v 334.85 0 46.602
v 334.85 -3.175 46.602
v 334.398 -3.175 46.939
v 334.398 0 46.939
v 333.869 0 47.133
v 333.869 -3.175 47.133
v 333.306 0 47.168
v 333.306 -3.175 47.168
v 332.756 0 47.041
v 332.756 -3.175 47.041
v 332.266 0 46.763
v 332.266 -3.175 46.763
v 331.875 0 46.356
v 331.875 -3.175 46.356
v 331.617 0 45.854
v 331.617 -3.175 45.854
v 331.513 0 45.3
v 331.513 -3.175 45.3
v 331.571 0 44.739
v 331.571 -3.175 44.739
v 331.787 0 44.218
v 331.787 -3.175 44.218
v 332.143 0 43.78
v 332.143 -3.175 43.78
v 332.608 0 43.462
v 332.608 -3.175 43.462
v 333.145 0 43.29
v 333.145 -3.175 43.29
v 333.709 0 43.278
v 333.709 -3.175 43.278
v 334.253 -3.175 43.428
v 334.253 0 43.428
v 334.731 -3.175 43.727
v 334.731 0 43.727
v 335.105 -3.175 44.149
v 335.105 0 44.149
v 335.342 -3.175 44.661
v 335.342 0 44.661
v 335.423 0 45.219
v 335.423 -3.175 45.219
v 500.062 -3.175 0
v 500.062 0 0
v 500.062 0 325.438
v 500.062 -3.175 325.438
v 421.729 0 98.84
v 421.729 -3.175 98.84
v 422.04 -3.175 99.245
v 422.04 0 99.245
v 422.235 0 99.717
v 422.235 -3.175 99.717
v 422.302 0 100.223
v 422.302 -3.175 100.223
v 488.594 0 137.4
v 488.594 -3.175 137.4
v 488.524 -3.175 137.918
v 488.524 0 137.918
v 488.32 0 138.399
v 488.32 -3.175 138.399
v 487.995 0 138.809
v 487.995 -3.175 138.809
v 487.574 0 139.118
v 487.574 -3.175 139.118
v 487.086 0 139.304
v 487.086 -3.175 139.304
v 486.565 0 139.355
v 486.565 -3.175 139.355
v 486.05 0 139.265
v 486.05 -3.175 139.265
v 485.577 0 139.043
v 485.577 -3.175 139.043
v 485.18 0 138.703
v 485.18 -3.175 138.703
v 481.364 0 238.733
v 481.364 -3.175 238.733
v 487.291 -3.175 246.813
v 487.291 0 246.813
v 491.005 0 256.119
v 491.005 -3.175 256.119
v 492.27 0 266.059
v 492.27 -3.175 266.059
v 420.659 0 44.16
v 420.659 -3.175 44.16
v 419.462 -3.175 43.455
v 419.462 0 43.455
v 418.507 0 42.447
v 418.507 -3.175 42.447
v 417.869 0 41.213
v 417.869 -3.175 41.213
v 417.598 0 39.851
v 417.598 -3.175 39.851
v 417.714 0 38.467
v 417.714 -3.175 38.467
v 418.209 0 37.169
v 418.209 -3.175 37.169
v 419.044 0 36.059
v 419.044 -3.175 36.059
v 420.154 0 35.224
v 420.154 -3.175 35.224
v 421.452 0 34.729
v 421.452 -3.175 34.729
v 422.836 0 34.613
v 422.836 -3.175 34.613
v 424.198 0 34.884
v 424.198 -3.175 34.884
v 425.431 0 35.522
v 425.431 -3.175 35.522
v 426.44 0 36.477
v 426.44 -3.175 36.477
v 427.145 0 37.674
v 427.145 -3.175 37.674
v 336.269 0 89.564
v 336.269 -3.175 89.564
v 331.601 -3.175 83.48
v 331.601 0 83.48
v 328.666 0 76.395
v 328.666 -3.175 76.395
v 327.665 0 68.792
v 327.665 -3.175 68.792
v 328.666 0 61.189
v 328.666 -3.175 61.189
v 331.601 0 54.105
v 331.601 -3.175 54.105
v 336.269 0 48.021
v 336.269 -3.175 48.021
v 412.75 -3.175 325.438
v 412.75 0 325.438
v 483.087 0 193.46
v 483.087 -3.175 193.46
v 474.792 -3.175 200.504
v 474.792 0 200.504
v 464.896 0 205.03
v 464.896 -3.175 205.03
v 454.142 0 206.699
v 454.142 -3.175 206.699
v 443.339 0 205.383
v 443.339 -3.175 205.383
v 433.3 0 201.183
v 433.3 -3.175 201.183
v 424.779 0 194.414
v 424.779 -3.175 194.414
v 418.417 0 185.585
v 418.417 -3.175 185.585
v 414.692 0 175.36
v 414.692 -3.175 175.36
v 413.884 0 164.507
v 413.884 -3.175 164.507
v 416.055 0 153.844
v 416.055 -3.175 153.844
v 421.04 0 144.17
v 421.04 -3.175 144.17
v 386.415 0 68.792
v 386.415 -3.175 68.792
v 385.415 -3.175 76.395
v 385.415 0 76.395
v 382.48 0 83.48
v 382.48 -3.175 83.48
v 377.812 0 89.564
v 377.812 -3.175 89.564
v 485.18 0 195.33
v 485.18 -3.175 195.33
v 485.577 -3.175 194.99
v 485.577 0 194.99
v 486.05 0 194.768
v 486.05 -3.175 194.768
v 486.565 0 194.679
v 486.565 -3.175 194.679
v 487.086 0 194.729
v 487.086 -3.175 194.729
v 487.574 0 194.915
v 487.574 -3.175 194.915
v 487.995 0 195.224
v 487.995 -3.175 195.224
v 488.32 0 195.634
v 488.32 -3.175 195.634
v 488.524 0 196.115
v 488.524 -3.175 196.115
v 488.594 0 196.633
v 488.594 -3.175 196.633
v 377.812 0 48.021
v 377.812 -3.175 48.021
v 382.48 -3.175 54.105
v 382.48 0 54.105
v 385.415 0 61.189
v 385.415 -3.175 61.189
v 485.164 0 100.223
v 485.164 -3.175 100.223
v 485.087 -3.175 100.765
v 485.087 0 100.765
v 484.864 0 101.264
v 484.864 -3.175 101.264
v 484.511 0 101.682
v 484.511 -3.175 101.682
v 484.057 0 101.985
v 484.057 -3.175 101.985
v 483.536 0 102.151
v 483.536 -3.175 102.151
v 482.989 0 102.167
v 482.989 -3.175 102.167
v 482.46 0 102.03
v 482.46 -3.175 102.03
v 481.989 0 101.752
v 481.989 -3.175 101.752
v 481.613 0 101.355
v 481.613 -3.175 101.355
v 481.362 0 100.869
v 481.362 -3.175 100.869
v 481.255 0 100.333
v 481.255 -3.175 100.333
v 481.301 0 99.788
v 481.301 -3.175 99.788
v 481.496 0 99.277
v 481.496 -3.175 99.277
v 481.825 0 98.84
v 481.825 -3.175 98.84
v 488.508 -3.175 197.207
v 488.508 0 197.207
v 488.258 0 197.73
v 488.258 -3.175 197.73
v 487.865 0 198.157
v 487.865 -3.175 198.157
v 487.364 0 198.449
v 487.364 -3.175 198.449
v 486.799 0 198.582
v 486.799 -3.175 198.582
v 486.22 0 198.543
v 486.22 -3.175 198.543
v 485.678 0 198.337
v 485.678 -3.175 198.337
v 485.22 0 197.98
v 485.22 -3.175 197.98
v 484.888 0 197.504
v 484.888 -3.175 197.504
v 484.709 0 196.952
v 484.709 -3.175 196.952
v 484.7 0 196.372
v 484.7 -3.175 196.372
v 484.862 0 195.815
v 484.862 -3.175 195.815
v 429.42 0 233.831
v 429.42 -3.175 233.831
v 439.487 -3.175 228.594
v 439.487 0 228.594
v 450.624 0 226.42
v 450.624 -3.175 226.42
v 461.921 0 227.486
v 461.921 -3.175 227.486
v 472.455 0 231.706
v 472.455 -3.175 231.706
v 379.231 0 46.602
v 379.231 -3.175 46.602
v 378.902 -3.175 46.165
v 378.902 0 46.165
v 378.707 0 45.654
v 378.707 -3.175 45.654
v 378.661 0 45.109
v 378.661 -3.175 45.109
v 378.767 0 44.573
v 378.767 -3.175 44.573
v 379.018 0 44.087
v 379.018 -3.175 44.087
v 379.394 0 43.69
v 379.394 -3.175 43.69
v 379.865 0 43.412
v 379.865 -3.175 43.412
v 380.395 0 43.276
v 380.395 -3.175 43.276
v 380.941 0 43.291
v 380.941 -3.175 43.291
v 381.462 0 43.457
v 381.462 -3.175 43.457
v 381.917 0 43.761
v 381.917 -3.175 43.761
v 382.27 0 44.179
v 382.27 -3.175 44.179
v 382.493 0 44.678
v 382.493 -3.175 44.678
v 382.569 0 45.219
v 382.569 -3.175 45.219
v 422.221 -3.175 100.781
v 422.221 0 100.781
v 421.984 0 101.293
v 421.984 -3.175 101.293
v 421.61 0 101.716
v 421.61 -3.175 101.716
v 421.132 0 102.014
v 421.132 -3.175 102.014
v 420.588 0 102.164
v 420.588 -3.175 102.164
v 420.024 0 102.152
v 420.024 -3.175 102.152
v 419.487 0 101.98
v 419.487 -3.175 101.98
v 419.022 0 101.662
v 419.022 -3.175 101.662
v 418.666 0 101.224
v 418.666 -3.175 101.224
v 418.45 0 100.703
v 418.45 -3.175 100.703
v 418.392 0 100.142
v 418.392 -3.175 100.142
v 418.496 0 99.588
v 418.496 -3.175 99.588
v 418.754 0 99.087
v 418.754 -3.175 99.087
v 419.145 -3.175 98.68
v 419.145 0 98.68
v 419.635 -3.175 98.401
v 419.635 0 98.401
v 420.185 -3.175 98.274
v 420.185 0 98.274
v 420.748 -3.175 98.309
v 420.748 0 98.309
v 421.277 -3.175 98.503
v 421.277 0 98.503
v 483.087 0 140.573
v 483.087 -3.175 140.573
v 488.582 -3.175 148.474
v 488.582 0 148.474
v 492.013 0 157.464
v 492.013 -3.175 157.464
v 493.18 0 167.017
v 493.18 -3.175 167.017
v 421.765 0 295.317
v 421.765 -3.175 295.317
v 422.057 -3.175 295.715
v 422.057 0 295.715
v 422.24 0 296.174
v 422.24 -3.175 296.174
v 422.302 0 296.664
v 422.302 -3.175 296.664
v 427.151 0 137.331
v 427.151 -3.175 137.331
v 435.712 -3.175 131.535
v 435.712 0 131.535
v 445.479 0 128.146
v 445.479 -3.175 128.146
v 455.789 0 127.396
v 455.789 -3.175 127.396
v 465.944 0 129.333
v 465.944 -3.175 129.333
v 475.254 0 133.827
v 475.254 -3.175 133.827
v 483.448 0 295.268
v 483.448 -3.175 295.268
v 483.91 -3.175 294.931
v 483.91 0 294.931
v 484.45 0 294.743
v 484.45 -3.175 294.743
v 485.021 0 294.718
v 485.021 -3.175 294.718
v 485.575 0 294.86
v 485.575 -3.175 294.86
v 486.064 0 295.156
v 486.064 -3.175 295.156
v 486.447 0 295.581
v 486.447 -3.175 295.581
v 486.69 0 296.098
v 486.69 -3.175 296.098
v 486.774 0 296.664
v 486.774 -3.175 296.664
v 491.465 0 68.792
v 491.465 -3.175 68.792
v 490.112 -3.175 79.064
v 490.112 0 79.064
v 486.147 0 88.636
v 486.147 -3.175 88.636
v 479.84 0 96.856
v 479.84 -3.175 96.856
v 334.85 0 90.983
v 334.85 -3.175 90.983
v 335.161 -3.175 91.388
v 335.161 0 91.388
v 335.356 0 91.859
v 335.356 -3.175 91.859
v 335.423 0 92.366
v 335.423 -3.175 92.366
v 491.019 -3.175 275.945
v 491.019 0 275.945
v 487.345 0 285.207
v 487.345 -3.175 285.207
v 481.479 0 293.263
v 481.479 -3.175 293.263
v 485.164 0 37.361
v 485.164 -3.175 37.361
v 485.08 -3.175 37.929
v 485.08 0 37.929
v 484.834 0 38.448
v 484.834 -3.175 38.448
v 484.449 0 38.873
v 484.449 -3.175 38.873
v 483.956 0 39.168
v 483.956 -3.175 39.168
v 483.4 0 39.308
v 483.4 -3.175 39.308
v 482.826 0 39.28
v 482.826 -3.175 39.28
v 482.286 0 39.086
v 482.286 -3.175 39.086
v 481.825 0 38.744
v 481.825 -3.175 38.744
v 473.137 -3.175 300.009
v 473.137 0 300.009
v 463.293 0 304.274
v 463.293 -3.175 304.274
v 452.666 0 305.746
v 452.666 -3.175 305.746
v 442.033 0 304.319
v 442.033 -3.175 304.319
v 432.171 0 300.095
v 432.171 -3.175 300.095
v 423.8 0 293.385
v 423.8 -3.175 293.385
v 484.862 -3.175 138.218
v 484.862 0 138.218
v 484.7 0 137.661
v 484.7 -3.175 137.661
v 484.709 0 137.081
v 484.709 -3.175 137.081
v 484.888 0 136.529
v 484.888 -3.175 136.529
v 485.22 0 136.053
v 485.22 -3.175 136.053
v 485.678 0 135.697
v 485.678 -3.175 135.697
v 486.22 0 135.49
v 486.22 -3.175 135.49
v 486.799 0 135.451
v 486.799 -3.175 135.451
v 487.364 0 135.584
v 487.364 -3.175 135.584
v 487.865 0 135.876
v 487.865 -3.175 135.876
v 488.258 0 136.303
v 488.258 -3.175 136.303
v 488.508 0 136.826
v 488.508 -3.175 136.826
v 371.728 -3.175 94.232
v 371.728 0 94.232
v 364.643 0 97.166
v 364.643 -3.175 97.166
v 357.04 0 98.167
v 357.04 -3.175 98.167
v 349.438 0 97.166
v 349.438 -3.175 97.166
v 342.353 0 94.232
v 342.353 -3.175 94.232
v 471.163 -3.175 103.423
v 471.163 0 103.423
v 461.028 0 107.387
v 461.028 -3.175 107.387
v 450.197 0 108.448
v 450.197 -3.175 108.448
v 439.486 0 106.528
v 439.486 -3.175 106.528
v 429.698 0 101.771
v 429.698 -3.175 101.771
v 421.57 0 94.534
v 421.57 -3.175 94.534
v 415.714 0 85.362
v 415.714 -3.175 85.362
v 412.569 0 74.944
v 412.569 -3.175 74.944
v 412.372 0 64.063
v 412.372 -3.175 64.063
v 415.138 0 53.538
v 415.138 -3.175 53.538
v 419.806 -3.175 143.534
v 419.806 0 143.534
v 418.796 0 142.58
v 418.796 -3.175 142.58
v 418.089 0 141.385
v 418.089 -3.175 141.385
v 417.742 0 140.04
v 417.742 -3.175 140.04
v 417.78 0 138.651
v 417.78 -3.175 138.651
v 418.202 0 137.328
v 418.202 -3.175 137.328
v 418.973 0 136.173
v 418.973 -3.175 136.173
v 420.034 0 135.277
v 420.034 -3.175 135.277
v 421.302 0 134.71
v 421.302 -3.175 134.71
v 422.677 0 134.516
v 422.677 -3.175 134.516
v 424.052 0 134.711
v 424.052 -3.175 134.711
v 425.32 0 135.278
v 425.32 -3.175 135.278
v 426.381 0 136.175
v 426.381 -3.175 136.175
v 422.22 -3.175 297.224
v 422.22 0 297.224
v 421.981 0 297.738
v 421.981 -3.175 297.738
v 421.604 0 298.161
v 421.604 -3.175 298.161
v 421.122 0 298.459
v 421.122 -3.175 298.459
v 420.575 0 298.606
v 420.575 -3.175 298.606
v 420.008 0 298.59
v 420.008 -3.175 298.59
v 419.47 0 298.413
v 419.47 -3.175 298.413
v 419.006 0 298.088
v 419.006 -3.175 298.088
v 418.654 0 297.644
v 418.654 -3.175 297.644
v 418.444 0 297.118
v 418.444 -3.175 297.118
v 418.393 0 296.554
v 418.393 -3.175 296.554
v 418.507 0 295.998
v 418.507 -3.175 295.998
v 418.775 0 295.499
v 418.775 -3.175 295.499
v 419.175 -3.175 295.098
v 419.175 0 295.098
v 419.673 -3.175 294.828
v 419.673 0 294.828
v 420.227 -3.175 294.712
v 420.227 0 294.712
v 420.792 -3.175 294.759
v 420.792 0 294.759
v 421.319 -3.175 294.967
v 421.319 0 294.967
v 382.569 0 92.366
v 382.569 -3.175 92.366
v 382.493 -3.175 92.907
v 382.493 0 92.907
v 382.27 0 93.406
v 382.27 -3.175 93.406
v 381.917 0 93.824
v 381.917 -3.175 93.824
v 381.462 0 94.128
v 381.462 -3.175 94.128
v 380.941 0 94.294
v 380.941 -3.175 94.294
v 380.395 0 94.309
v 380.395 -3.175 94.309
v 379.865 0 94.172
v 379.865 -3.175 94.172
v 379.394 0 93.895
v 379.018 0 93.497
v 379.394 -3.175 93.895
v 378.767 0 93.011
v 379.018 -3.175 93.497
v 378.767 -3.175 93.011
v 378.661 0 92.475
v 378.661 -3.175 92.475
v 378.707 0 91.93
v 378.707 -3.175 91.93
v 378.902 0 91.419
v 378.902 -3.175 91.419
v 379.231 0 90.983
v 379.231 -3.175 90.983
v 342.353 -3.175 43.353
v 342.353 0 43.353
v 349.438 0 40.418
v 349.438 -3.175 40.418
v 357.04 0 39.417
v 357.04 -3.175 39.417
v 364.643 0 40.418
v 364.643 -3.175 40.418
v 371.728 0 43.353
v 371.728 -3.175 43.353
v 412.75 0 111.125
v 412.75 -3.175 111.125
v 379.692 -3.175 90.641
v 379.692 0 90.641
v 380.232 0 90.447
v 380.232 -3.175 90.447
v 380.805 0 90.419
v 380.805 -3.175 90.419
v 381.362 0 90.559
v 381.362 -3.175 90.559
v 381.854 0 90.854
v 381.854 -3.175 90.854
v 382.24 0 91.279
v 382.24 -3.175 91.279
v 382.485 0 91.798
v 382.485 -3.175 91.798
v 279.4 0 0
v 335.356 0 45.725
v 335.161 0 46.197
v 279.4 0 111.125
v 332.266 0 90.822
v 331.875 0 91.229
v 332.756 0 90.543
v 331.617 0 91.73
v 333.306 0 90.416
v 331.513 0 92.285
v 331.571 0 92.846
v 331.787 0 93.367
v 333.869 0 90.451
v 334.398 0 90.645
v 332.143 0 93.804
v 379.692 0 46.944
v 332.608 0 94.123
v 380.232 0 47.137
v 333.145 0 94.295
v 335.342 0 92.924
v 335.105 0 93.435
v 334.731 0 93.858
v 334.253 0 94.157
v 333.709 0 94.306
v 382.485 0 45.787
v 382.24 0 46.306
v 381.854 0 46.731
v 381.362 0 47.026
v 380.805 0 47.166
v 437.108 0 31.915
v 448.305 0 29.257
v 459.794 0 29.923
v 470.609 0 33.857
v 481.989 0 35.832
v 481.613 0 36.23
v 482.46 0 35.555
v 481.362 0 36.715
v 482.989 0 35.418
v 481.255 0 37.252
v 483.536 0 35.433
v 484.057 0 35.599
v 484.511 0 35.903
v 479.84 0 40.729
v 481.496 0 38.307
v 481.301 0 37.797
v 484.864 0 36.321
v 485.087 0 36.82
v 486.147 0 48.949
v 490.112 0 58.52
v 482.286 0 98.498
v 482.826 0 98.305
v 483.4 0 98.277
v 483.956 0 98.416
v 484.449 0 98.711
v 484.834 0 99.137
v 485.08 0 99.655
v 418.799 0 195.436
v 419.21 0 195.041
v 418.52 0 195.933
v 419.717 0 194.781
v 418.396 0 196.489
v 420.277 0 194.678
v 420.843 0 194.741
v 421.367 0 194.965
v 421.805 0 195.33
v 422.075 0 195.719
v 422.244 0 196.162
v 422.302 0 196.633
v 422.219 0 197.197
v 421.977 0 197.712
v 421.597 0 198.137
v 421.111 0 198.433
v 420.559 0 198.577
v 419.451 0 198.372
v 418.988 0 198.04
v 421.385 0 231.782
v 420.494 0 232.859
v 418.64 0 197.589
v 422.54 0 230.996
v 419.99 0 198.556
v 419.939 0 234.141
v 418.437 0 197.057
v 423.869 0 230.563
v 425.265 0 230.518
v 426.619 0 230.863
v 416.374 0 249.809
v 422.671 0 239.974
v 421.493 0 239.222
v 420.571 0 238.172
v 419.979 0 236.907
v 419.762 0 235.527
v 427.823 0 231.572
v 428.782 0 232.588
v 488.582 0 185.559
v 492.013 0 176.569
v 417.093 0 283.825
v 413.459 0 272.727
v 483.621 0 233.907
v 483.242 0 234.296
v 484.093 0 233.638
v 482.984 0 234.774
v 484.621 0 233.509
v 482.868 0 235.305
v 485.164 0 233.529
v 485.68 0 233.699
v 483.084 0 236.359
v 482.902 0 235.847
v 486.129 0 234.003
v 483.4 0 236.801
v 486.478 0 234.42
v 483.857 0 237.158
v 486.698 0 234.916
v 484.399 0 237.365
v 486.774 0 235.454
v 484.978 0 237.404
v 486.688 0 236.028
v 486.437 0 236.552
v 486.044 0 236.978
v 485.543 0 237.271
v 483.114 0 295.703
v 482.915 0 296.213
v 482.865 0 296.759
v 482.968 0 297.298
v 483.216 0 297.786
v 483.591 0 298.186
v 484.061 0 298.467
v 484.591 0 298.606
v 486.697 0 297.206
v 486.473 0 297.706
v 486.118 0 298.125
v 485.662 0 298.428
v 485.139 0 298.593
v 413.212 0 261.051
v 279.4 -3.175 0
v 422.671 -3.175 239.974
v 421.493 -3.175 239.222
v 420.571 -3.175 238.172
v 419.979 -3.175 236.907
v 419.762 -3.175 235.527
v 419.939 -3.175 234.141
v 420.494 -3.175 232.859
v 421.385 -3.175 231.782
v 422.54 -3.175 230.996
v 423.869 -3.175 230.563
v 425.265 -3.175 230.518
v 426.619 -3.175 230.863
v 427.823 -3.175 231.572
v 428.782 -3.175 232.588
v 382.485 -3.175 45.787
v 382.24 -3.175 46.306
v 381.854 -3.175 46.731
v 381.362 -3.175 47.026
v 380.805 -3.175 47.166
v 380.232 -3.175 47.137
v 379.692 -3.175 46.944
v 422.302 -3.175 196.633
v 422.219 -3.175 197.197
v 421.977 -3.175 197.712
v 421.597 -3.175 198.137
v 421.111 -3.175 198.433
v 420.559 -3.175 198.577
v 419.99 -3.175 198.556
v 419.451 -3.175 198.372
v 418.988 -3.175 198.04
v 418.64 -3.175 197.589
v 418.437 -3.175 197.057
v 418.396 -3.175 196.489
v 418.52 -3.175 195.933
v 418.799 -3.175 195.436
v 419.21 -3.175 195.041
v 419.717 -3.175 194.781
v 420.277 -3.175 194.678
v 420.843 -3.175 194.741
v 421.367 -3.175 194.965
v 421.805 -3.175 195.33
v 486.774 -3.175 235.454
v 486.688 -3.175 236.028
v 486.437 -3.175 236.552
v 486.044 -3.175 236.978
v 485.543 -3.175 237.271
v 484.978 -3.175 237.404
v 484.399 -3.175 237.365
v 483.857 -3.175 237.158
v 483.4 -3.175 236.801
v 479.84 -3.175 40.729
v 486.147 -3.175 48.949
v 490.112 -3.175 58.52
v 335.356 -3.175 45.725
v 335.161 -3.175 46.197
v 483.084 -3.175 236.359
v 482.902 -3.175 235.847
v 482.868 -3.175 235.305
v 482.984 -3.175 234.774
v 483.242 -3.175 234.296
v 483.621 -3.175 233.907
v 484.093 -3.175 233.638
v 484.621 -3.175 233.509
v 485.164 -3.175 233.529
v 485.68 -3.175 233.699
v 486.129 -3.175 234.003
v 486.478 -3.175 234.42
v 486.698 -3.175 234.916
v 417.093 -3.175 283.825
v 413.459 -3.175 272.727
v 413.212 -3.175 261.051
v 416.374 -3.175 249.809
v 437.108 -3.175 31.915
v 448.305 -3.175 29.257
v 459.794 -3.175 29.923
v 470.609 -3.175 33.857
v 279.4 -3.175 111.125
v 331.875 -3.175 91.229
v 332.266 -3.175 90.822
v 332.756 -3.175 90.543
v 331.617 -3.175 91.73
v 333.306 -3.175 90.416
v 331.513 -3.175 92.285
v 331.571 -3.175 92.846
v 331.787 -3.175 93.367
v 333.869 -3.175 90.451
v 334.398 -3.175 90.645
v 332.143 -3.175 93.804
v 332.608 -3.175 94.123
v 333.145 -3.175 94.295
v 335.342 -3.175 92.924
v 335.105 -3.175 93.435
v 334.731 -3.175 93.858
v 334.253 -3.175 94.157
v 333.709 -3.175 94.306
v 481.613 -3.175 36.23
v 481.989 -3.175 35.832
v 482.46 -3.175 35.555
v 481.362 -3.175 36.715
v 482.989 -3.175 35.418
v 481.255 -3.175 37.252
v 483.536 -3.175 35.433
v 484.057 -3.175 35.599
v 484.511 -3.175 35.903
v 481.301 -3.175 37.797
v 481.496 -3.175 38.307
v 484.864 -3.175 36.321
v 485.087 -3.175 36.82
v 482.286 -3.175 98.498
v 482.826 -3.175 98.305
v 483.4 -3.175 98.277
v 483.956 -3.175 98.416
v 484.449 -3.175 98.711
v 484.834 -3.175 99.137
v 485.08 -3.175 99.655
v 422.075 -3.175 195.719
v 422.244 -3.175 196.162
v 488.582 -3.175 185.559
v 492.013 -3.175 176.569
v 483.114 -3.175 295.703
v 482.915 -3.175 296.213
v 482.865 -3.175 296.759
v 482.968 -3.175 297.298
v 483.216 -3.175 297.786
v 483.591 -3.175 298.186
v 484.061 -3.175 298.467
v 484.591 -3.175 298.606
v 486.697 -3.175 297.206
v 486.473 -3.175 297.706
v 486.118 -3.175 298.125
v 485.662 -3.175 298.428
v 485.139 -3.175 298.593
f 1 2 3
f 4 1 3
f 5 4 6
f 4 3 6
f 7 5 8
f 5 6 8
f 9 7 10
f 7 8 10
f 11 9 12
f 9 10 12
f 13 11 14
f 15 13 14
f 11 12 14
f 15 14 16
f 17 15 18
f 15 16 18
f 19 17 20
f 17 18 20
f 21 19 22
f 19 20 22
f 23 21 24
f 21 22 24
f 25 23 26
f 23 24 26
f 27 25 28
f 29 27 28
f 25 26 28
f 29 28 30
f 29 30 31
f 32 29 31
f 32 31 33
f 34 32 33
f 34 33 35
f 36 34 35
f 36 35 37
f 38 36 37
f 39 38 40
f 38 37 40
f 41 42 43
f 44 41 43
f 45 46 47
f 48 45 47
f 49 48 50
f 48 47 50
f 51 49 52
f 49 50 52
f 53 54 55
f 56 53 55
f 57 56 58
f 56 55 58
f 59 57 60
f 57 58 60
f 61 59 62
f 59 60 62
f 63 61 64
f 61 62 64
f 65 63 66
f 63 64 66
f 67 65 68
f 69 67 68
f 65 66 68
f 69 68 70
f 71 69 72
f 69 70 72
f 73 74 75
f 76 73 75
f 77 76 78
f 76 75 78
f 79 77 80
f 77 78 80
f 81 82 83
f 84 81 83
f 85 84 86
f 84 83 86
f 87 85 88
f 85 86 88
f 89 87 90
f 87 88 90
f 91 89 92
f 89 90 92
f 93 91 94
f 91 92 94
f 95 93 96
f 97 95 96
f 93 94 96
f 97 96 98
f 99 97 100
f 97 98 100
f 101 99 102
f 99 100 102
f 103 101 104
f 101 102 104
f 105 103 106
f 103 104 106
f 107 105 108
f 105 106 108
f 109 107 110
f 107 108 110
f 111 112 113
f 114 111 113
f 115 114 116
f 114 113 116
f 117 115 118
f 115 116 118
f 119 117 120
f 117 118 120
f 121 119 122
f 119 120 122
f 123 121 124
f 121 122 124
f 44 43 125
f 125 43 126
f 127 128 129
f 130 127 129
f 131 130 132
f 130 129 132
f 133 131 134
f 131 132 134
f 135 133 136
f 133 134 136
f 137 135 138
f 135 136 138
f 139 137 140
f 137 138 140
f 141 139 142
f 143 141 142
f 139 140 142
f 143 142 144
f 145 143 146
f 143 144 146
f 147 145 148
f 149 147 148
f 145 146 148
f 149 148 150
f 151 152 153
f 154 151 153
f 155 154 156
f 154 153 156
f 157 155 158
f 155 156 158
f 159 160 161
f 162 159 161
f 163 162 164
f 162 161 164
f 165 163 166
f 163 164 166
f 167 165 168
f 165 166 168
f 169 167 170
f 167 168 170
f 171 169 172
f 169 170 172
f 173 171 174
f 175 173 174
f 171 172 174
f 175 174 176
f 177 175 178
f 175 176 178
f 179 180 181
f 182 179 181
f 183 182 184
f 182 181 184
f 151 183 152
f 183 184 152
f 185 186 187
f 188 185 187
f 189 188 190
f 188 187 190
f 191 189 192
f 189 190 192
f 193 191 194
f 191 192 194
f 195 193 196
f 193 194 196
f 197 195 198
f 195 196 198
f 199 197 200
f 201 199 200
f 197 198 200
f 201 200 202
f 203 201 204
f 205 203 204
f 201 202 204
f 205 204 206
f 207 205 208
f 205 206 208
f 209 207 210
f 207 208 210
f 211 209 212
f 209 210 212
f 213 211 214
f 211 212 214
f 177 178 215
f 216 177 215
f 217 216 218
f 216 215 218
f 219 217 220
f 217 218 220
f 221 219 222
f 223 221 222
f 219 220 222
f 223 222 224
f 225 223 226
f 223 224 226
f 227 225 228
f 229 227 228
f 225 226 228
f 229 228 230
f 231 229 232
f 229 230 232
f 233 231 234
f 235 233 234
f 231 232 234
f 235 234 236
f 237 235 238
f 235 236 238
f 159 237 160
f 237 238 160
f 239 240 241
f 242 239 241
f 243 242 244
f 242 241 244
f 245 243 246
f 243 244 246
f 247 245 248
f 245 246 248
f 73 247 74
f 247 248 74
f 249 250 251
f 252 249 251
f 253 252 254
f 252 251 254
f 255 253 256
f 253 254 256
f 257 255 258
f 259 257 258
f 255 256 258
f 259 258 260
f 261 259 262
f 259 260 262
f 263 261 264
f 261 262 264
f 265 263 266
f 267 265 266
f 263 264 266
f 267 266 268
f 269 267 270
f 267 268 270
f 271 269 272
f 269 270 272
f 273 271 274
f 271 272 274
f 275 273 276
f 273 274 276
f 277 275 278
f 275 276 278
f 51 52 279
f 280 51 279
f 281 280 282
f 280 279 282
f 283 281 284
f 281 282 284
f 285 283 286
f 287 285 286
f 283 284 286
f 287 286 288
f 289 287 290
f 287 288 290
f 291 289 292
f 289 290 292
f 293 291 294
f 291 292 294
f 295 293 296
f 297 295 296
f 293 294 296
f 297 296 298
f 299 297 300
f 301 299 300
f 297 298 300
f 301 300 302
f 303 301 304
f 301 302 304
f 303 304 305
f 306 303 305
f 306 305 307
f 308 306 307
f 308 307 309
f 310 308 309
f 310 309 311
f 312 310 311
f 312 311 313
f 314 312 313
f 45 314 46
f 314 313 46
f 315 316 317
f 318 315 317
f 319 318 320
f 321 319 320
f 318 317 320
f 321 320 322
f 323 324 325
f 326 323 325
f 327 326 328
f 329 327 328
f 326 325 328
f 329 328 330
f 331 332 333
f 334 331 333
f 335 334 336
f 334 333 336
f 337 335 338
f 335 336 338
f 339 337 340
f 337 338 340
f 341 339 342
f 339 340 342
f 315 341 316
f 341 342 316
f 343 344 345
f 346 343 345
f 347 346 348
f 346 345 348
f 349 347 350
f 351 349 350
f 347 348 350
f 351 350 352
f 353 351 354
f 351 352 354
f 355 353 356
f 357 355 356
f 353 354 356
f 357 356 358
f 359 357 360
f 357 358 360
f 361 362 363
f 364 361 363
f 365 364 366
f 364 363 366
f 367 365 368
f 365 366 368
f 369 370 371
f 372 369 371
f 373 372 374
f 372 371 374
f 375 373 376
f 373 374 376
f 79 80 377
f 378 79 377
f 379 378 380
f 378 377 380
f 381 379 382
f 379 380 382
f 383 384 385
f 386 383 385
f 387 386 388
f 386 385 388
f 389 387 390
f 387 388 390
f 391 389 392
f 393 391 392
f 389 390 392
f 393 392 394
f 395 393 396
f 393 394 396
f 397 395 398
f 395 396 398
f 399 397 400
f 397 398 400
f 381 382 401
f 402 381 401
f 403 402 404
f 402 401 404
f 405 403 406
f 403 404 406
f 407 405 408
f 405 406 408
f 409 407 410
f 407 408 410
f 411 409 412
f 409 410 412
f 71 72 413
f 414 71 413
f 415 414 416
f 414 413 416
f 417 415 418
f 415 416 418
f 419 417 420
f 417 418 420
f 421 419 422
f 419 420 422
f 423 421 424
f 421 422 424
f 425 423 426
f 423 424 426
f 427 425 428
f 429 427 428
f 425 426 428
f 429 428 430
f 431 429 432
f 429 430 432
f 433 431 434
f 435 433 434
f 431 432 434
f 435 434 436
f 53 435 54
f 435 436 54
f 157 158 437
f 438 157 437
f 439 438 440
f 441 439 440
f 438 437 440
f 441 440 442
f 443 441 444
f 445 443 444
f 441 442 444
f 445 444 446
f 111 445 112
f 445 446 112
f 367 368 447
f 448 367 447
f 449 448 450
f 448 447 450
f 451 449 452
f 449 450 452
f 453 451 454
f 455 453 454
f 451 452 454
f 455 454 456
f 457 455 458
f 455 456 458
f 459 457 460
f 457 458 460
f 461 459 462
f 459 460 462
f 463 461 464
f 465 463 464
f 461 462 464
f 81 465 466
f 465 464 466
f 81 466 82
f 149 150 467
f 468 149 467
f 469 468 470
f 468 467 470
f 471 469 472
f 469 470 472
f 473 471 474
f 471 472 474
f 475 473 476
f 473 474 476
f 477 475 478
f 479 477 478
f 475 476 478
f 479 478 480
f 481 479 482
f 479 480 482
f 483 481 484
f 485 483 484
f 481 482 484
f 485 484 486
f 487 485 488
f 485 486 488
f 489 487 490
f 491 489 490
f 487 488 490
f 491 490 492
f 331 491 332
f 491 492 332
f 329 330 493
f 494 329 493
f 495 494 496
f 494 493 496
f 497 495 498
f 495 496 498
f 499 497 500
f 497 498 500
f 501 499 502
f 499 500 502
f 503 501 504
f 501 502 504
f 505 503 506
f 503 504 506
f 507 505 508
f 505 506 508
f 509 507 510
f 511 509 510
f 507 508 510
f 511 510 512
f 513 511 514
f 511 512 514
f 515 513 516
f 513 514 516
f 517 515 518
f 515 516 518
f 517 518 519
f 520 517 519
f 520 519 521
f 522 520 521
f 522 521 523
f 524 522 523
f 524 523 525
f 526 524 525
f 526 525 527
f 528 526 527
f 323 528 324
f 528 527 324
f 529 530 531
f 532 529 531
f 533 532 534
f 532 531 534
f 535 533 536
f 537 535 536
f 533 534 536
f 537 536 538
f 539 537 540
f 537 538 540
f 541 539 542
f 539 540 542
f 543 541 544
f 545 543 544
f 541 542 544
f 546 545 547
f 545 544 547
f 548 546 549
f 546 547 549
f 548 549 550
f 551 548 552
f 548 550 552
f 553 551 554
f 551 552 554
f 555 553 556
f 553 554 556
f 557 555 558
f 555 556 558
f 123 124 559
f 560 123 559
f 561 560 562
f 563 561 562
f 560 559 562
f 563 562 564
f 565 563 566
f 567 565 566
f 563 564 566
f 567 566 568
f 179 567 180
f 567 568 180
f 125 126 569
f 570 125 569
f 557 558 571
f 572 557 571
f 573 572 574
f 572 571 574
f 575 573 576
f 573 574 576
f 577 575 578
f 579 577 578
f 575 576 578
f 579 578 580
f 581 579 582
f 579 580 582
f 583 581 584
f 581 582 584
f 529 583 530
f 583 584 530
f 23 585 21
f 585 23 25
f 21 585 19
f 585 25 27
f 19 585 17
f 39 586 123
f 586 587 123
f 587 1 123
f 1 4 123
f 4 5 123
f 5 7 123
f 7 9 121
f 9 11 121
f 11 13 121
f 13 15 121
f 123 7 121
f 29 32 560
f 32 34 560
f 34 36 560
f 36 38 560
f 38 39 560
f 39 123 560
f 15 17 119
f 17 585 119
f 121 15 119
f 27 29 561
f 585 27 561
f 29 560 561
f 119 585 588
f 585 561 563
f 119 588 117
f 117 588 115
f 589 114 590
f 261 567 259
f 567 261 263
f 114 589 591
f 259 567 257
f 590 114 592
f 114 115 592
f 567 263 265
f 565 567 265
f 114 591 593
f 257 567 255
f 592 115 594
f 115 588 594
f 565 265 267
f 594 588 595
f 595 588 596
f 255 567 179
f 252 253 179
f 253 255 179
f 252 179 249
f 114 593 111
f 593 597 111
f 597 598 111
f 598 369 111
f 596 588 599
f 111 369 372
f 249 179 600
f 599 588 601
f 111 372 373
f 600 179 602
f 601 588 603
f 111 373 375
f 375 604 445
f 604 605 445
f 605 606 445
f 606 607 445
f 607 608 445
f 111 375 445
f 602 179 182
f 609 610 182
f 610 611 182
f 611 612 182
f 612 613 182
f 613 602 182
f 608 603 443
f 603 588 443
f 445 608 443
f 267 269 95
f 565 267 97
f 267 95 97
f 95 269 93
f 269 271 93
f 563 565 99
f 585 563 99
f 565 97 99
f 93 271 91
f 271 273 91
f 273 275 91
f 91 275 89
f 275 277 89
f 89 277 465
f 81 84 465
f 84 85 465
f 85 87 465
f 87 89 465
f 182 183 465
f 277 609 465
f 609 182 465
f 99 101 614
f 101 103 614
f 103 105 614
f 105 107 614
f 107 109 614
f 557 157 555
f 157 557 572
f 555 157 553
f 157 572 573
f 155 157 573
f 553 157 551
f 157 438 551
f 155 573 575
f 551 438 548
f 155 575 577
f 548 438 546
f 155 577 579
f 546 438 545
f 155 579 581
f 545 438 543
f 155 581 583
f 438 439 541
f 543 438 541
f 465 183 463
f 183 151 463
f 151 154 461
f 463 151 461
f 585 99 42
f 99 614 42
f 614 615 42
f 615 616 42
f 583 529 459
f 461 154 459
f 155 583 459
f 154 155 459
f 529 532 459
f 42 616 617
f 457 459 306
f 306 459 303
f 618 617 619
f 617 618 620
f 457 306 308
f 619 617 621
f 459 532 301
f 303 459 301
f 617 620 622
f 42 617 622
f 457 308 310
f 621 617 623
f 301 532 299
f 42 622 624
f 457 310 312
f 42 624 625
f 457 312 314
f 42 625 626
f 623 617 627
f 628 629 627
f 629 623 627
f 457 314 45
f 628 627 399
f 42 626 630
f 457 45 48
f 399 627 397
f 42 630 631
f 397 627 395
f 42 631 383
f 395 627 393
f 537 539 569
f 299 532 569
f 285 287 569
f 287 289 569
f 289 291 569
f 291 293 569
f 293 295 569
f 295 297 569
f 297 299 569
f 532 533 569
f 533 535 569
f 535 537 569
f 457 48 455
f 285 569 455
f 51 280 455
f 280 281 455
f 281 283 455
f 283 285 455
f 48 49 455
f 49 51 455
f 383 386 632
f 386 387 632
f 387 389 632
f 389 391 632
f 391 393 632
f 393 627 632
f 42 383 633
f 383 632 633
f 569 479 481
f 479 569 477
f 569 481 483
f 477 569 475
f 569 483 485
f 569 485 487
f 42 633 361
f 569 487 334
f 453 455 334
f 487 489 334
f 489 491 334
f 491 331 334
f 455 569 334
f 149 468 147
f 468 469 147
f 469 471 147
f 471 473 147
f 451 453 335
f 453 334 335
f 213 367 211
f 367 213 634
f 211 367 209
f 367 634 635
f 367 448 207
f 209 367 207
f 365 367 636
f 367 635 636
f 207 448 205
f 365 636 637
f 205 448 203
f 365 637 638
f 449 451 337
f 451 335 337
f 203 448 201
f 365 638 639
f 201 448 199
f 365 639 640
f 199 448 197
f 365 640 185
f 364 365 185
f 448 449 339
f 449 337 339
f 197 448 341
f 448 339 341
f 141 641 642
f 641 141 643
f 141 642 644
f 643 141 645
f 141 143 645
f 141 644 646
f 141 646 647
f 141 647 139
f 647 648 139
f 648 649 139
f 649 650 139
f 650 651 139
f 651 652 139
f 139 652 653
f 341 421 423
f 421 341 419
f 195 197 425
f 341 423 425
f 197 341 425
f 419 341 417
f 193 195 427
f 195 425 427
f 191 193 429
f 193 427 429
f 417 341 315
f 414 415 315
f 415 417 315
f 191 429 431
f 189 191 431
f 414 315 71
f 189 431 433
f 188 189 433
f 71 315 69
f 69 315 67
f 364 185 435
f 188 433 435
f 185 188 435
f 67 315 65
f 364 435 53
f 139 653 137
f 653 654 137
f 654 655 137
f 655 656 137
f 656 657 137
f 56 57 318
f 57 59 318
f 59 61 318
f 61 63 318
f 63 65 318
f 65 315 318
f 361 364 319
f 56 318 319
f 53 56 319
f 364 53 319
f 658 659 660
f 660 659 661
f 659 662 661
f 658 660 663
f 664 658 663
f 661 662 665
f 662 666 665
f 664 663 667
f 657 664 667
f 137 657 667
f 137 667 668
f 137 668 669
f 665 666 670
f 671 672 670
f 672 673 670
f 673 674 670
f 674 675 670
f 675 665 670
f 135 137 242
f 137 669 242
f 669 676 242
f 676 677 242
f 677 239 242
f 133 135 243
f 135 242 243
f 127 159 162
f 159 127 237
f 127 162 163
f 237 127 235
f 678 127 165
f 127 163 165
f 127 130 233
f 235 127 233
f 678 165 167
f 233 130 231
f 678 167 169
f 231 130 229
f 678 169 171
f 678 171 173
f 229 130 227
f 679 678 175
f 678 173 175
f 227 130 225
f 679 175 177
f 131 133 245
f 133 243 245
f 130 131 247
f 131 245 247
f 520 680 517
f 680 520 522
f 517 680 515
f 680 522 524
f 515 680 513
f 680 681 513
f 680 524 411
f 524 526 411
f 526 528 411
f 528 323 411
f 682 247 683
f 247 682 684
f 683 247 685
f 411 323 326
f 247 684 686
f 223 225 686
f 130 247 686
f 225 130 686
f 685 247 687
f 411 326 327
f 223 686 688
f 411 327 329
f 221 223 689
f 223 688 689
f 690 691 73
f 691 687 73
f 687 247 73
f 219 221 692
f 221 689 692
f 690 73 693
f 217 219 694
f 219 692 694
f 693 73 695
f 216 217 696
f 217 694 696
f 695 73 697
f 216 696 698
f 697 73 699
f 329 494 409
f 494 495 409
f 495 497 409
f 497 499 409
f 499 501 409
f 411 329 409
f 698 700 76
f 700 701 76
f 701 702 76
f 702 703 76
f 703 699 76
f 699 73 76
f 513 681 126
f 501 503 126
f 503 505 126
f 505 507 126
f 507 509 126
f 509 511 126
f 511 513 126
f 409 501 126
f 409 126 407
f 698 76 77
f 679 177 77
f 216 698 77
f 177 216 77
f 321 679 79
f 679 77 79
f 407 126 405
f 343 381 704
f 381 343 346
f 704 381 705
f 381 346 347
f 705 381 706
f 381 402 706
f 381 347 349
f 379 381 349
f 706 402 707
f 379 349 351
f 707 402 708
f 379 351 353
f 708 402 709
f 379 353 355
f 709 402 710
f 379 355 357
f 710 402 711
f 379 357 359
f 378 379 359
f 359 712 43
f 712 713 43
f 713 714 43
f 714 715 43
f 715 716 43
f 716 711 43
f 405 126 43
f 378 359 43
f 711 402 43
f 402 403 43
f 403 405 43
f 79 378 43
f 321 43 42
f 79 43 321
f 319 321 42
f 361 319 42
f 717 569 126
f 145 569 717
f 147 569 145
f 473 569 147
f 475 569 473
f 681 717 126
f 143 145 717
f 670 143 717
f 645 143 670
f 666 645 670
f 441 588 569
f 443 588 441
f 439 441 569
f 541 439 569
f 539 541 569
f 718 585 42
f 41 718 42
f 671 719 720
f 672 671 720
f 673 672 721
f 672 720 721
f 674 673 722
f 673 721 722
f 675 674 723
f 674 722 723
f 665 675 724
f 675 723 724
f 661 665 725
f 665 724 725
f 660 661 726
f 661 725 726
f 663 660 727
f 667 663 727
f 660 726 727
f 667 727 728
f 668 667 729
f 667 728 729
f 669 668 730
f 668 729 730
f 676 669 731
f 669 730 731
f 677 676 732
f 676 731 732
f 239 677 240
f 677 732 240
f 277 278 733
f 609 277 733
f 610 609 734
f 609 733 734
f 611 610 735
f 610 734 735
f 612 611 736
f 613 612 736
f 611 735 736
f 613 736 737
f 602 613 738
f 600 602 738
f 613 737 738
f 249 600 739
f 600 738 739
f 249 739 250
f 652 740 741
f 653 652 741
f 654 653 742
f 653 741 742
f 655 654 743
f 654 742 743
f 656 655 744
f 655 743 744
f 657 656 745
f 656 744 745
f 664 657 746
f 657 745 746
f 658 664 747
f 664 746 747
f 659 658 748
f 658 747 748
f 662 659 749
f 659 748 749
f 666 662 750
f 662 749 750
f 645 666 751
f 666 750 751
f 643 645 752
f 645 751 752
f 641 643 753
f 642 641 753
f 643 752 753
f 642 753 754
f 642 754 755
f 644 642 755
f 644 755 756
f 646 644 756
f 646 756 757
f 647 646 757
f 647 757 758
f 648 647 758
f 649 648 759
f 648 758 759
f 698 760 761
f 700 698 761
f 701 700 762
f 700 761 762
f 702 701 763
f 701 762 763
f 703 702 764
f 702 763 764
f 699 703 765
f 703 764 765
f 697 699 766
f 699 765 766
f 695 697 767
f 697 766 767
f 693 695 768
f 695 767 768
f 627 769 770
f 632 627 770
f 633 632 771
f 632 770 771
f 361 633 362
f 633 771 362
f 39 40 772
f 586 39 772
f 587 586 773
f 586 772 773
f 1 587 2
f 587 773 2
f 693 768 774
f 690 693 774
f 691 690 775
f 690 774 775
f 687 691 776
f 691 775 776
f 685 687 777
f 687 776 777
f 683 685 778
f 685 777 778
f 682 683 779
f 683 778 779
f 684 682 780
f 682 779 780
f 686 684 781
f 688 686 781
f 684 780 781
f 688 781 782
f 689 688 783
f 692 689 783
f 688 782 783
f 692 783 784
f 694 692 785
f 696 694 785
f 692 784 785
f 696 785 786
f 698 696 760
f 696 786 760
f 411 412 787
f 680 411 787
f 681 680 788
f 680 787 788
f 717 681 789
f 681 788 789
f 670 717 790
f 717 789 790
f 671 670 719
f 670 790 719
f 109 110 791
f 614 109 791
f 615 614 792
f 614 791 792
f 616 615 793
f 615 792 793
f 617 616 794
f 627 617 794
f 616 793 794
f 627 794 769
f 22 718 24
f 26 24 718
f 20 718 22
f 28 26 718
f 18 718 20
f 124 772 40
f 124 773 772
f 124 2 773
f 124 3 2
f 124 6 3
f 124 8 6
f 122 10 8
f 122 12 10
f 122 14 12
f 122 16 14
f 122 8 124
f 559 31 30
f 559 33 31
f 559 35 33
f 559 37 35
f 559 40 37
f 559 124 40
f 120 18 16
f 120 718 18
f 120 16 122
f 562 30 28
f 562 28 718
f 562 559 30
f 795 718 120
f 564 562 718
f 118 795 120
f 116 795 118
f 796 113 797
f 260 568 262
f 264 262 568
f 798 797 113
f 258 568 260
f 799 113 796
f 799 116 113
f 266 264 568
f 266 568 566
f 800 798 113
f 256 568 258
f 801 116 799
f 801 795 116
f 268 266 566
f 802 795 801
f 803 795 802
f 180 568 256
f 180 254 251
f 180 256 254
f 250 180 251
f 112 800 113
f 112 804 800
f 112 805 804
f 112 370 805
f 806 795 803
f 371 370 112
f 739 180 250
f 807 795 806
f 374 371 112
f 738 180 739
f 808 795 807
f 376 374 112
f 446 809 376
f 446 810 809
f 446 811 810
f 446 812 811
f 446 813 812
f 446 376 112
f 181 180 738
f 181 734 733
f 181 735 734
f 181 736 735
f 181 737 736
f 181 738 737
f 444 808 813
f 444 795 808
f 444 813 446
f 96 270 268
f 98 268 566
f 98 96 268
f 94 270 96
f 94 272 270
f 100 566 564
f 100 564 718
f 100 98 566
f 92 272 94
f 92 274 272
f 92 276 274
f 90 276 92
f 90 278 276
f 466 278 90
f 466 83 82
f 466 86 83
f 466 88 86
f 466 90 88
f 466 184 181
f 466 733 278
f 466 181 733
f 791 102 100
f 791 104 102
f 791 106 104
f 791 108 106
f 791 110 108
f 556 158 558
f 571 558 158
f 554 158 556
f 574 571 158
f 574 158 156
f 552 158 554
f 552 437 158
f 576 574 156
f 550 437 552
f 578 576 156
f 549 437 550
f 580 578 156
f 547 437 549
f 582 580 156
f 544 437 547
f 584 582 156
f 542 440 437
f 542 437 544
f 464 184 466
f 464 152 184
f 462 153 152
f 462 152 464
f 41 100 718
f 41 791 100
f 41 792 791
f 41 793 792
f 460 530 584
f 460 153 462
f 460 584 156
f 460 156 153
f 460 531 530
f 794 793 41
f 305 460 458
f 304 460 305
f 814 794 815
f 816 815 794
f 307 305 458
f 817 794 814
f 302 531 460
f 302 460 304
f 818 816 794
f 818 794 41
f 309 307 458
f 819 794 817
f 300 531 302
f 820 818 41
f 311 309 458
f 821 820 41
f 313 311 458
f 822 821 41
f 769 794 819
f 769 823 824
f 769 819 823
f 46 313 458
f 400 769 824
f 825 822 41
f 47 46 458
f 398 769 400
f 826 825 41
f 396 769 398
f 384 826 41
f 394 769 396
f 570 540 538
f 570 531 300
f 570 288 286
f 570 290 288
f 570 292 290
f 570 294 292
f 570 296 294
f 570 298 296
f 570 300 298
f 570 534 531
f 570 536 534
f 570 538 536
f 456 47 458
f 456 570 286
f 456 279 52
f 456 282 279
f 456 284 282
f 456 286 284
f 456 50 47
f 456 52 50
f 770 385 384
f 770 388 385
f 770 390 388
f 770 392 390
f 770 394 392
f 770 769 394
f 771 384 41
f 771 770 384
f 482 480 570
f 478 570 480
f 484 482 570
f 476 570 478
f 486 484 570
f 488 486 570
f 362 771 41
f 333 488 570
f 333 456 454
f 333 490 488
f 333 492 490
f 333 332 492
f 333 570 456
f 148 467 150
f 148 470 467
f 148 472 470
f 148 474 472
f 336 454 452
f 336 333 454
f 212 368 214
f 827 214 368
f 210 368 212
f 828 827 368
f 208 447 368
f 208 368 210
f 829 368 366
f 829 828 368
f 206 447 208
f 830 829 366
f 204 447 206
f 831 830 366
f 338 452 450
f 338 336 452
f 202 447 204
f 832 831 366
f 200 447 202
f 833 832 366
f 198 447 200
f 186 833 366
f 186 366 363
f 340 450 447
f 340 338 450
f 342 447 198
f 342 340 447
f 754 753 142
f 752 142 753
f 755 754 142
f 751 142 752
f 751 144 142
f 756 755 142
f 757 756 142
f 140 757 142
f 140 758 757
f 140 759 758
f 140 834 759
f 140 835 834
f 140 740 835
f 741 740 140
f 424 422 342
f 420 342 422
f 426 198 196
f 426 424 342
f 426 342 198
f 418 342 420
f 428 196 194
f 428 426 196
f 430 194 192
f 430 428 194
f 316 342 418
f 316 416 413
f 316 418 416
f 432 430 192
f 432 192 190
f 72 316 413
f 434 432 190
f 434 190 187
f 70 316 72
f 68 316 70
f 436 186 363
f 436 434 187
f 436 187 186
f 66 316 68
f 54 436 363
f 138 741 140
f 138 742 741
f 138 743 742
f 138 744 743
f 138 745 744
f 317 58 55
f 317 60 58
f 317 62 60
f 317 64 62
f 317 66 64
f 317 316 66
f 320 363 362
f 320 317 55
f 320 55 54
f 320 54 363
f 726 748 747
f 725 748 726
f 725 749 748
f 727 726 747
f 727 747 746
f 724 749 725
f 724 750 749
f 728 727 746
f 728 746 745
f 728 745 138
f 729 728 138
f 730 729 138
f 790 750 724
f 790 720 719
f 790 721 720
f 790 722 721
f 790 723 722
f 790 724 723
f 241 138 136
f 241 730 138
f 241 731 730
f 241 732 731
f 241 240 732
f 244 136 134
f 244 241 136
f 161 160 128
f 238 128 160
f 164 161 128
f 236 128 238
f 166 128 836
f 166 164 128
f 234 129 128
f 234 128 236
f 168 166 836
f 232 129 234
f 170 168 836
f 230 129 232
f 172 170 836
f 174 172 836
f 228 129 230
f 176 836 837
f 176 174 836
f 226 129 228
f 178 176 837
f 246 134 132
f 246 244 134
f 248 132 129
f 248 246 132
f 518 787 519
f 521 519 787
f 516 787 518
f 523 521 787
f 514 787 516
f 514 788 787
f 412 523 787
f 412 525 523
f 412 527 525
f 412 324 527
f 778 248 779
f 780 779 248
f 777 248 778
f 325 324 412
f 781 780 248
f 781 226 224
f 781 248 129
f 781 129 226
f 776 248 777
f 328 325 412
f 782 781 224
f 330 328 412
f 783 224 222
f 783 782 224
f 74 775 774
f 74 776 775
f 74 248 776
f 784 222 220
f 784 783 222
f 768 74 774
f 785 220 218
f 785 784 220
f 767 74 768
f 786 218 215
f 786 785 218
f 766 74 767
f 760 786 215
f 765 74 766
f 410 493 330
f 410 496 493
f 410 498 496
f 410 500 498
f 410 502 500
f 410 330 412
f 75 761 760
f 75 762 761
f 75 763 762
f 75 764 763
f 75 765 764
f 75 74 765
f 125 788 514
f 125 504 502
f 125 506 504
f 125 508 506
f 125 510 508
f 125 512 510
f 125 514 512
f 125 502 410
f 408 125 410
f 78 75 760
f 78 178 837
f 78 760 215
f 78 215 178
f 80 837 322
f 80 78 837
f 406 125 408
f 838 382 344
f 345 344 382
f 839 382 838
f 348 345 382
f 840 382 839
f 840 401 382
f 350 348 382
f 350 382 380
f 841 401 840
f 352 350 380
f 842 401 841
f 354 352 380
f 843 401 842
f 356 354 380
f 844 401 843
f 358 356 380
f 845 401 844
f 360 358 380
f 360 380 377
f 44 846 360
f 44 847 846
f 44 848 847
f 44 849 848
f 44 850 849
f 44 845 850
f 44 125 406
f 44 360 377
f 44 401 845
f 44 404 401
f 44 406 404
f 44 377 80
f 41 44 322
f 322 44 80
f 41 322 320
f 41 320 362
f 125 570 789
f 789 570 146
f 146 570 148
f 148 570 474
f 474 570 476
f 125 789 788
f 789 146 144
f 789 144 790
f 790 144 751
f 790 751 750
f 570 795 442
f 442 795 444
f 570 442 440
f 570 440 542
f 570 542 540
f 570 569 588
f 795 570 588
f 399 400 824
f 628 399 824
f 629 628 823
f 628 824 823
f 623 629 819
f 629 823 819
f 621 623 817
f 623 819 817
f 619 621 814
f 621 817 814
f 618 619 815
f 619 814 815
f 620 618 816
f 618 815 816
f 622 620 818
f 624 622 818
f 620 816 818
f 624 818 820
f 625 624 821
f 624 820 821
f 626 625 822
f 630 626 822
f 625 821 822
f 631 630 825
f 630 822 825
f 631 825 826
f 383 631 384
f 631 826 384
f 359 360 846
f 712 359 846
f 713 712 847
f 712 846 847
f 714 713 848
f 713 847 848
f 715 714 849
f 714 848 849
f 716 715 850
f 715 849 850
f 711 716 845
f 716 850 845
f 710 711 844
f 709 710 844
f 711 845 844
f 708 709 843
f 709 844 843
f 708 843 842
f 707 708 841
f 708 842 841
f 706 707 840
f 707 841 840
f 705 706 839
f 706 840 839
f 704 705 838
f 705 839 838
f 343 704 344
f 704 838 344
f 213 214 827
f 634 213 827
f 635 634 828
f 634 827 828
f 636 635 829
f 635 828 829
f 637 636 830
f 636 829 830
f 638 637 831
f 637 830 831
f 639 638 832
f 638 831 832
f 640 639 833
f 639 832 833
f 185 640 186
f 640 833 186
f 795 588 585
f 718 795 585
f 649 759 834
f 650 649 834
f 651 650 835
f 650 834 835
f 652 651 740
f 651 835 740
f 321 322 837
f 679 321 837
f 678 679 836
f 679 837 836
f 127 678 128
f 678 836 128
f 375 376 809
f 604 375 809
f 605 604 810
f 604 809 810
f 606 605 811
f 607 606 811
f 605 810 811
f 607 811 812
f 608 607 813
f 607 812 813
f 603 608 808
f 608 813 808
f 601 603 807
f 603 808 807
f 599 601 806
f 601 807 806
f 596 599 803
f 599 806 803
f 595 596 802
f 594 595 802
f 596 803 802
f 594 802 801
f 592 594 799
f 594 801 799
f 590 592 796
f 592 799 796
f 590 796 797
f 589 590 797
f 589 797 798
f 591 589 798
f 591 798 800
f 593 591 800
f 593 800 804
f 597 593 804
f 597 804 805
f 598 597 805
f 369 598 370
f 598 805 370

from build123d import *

# Parameters (mm, degrees)
F2_DEPTH = 3.175
F4_DEPTH = 3.175


with BuildPart() as f2:
    # F0 (on Front) → F2 (new body)
    with BuildSketch(Plane.XZ):
        Polygon((279.4, 111.125), (279.4, 0), (500.0625, 0), (500.0625, 325.4375), (412.75, 325.4375), (412.75, 111.125), align=None)
    extrude(amount=F2_DEPTH)

    # F3 (on face) → F4 (cut)
    with BuildSketch(Plane.XZ.offset(3.175)):
        with BuildLine():
            ThreePointArc((481.3642272004, 238.7334597472), (489.4425878701, 251.3483811153), (492.2696260085, 266.0590577686))
            ThreePointArc((492.2696260085, 266.0590577686), (489.4735670658, 280.6918713383), (481.4793654496, 293.2628664897))
            Line((481.4793654496, 293.2628664897), (453.7159248077, 264.9826342644))
            Line((453.7159248077, 264.9826342644), (481.3642272004, 238.7334597472))
        make_face()
        with BuildLine():
            ThreePointArc((486.7738793434, 235.4543879846), (485.5430214889, 237.2708715452), (483.3996973967, 236.8009934551))
            ThreePointArc((483.3996973967, 236.8009934551), (484.0931371979, 233.6379044241), (486.7738793434, 235.4543879846))
        make_face()
        with BuildLine():
            ThreePointArc((422.3019726735, 296.6637275526), (418.529689113, 297.3886696981), (421.7645546203, 295.3171220821))
            ThreePointArc((421.7645546203, 295.3171220821), (422.1626562341, 295.9387854072), (422.3019726735, 296.6637275526))
        make_face()
        with BuildLine():
            ThreePointArc((486.7738793434, 296.6637275526), (484.061304278, 298.4671812228), (483.4479307389, 295.2680748589))
            ThreePointArc((483.4479307389, 295.2680748589), (485.5748544088, 294.8602738825), (486.7738793434, 296.6637275526))
        make_face()
        with BuildLine():
            Line((453.7159248077, 264.9826342644), (481.4793654496, 293.2628664897))
            ThreePointArc((481.4793654496, 293.2628664897), (452.6659255462, 305.7464692978), (423.8000248166, 293.3846557901))
            Line((423.8000248166, 293.3846557901), (453.7159248077, 264.9826342644))
        make_face()
        with BuildLine():
            ThreePointArc((429.4202432807, 233.8313547051), (456.3109827176, 226.5471192703), (481.3642272004, 238.7334597472))
            Line((481.3642272004, 238.7334597472), (453.7159248077, 264.9826342644))
            Line((453.7159248077, 264.9826342644), (428.2060301838, 238.997895798))
            ThreePointArc((428.2060301838, 238.997895798), (429.3061748634, 237.375810391), (429.6929762593, 235.4543879846))
            ThreePointArc((429.6929762593, 235.4543879846), (429.624318368, 234.631493656), (429.4202432807, 233.8313547051))
        make_face()
        with BuildLine():
            Line((453.7159248077, 264.9826342644), (423.8000248166, 293.3846557901))
            ThreePointArc((423.8000248166, 293.3846557901), (412.9034918494, 266.8978947734), (422.6708882255, 239.9742823135))
            ThreePointArc((422.6708882255, 239.9742823135), (425.5898965922, 240.3445886606), (428.2060301838, 238.997895798))
            Line((428.2060301838, 238.997895798), (453.7159248077, 264.9826342644))
        make_face()
        with BuildLine():
            ThreePointArc((422.6708882255, 239.9742823135), (421.3848554166, 231.7820046441), (429.4202432807, 233.8313547051))
            ThreePointArc((429.4202432807, 233.8313547051), (427.6277830511, 235.1984287437), (425.9158340881, 236.6650697529))
            ThreePointArc((425.9158340881, 236.6650697529), (424.2450136155, 238.2722674273), (422.6708882255, 239.9742823135))
        make_face()
        with BuildLine():
            ThreePointArc((425.9158340881, 236.6650697529), (427.6277830511, 235.1984287437), (429.4202432807, 233.8313547051))
            ThreePointArc((429.4202432807, 233.8313547051), (429.624318368, 234.631493656), (429.6929762593, 235.4543879846))
            ThreePointArc((429.6929762593, 235.4543879846), (429.3061748634, 237.375810391), (428.2060301838, 238.997895798))
            Line((428.2060301838, 238.997895798), (425.9158340881, 236.6650697529))
        make_face()
        with BuildLine():
            ThreePointArc((428.2060301838, 238.997895798), (425.5898965922, 240.3445886606), (422.6708882255, 239.9742823135))
            ThreePointArc((422.6708882255, 239.9742823135), (424.2450136155, 238.2722674273), (425.9158340881, 236.6650697529))
            Line((425.9158340881, 236.6650697529), (428.2060301838, 238.997895798))
        make_face()
        with BuildLine():
            ThreePointArc((483.0871414525, 140.5732665968), (490.5709178225, 152.8645917792), (493.1798448587, 167.0165203833))
            ThreePointArc((493.1798448587, 167.0165203833), (490.5709178225, 181.1684489874), (483.0871414525, 193.4597741698))
            Line((483.0871414525, 193.4597741698), (453.4923448587, 167.0165203833))
            Line((453.4923448587, 167.0165203833), (483.0871414525, 140.5732665968))
        make_face()
        with BuildLine():
            ThreePointArc((488.5943170438, 137.4000761424), (487.3359240854, 139.2273082181), (485.1800854677, 138.703199689))
            ThreePointArc((485.1800854677, 138.703199689), (485.9411100022, 135.5728440667), (488.5943170438, 137.4000761424))
        make_face()
        with BuildLine():
            ThreePointArc((422.3019726735, 196.6329646242), (418.5189405979, 197.3303716658), (421.8046042497, 195.3298410776))
            ThreePointArc((421.8046042497, 195.3298410776), (422.1734047492, 195.9355575826), (422.3019726735, 196.6329646242))
        make_face()
        with BuildLine():
            ThreePointArc((488.5943170438, 196.6329646242), (485.9411100022, 198.4601966998), (485.1800854677, 195.3298410776))
            ThreePointArc((485.1800854677, 195.3298410776), (487.3359240854, 194.8057325485), (488.5943170438, 196.6329646242))
        make_face()
        with BuildLine():
            Line((453.4923448587, 167.0165203833), (483.0871414525, 193.4597741698))
            ThreePointArc((483.0871414525, 193.4597741698), (453.4923448587, 206.7040203833), (423.8975482648, 193.4597741698))
            Line((423.8975482648, 193.4597741698), (453.4923448587, 167.0165203833))
        make_face()
        with BuildLine():
            ThreePointArc((427.1514613938, 137.3305722842), (455.7892458718, 127.3955423289), (483.0871414525, 140.5732665968))
            Line((483.0871414525, 140.5732665968), (453.4923448587, 167.0165203833))
            Line((453.4923448587, 167.0165203833), (426.3787760112, 142.7902689942))
            ThreePointArc((426.3787760112, 142.7902689942), (427.3151461106, 141.2523783874), (427.6415750614, 139.4816890805))
            ThreePointArc((427.6415750614, 139.4816890805), (427.5174964603, 138.3785668209), (427.1514613938, 137.3305722842))
        make_face()
        with BuildLine():
            Line((453.4923448587, 167.0165203833), (423.8975482648, 193.4597741698))
            ThreePointArc((423.8975482648, 193.4597741698), (413.8713668043, 169.3134213964), (421.0401435648, 144.1702452507))
            ThreePointArc((421.0401435648, 144.1702452507), (423.9186063293, 144.2893699648), (426.3787760112, 142.7902689942))
            Line((426.3787760112, 142.7902689942), (453.4923448587, 167.0165203833))
        make_face()
        with BuildLine():
            ThreePointArc((421.0401435648, 144.1702452507), (418.9729741116, 136.1731091667), (427.1514613938, 137.3305722842))
            ThreePointArc((427.1514613938, 137.3305722842), (425.4775480093, 138.9048001631), (423.8975482648, 140.5732665968))
            ThreePointArc((423.8975482648, 140.5732665968), (422.4167587728, 142.330378407), (421.0401435648, 144.1702452507))
        make_face()
        with BuildLine():
            ThreePointArc((423.8975482648, 140.5732665968), (425.4775480093, 138.9048001631), (427.1514613938, 137.3305722842))
            ThreePointArc((427.1514613938, 137.3305722842), (427.5174964603, 138.3785668209), (427.6415750614, 139.4816890805))
            ThreePointArc((427.6415750614, 139.4816890805), (427.3151461106, 141.2523783874), (426.3787760112, 142.7902689942))
            Line((426.3787760112, 142.7902689942), (423.8975482648, 140.5732665968))
        make_face()
        with BuildLine():
            ThreePointArc((426.3787760112, 142.7902689942), (423.9186063293, 144.2893699648), (421.0401435648, 144.1702452507))
            ThreePointArc((421.0401435648, 144.1702452507), (422.4167587728, 142.330378407), (423.8975482648, 140.5732665968))
            Line((423.8975482648, 140.5732665968), (426.3787760112, 142.7902689942))
        make_face()
        with BuildLine():
            ThreePointArc((479.8403694756, 40.7290278601), (488.4435380438, 53.6045795165), (491.4645690973, 68.7923282385))
            ThreePointArc((491.4645690973, 68.7923282385), (488.4435380438, 83.9800769605), (479.8403694756, 96.8556286168))
            Line((479.8403694756, 96.8556286168), (451.7770690973, 68.7923282385))
            Line((451.7770690973, 68.7923282385), (479.8403694756, 40.7290278601))
        make_face()
        with BuildLine():
            ThreePointArc((485.163765521, 37.3614318147), (483.956417778, 39.1683554044), (481.8250060784, 38.7443912574))
            ThreePointArc((481.8250060784, 38.7443912574), (482.459513264, 35.5545082251), (485.163765521, 37.3614318147))
        make_face()
        with BuildLine():
            ThreePointArc((422.3019726735, 100.2232246622), (418.5392490839, 100.9716769192), (421.7291321162, 98.8402652196))
            ThreePointArc((421.7291321162, 98.8402652196), (422.1530962632, 99.4747724052), (422.3019726735, 100.2232246622))
        make_face()
        with BuildLine():
            ThreePointArc((485.163765521, 100.2232246622), (482.459513264, 102.0301482519), (481.8250060784, 98.8402652196))
            ThreePointArc((481.8250060784, 98.8402652196), (483.956417778, 98.4163010725), (485.163765521, 100.2232246622))
        make_face()
        with BuildLine():
            Line((451.7770690973, 68.7923282385), (479.8403694756, 96.8556286168))
            ThreePointArc((479.8403694756, 96.8556286168), (451.7770690973, 108.4798282385), (423.7137687189, 96.8556286168))
            Line((423.7137687189, 96.8556286168), (451.7770690973, 68.7923282385))
        make_face()
        with BuildLine():
            ThreePointArc((427.1446274419, 37.6741587174), (454.0739701104, 29.1713501841), (479.8403694756, 40.7290278601))
            Line((479.8403694756, 40.7290278601), (451.7770690973, 68.7923282385))
            Line((451.7770690973, 68.7923282385), (426.0665958227, 43.0818549639))
            ThreePointArc((426.0665958227, 43.0818549639), (427.1430242739, 41.4708659406), (427.5210156793, 39.5705748205))
            ThreePointArc((427.5210156793, 39.5705748205), (427.426009773, 38.6038713834), (427.1446274419, 37.6741587174))
        make_face()
        with BuildLine():
            Line((451.7770690973, 68.7923282385), (423.7137687189, 96.8556286168))
            ThreePointArc((423.7137687189, 96.8556286168), (412.1560910429, 71.0892292516), (420.6588995762, 44.1598865831))
            ThreePointArc((420.6588995762, 44.1598865831), (423.5261320935, 44.4404507922), (426.0665958227, 43.0818549639))
            Line((426.0665958227, 43.0818549639), (451.7770690973, 68.7923282385))
        make_face()
        with BuildLine():
            ThreePointArc((420.6588995762, 44.1598865831), (419.044035536, 36.0592946772), (427.1446274419, 37.6741587174))
            ThreePointArc((427.1446274419, 37.6741587174), (425.3849611199, 39.1519116969), (423.7137687189, 40.7290278601))
            ThreePointArc((423.7137687189, 40.7290278601), (422.1366525557, 42.4002202611), (420.6588995762, 44.1598865831))
        make_face()
        with BuildLine():
            ThreePointArc((423.7137687189, 40.7290278601), (425.3849611199, 39.1519116969), (427.1446274419, 37.6741587174))
            ThreePointArc((427.1446274419, 37.6741587174), (427.426009773, 38.6038713834), (427.5210156793, 39.5705748205))
            ThreePointArc((427.5210156793, 39.5705748205), (427.1430242739, 41.4708659406), (426.0665958227, 43.0818549639))
            Line((426.0665958227, 43.0818549639), (423.7137687189, 40.7290278601))
        make_face()
        with BuildLine():
            ThreePointArc((426.0665958227, 43.0818549639), (423.5261320935, 44.4404507922), (420.6588995762, 44.1598865831))
            ThreePointArc((420.6588995762, 44.1598865831), (422.1366525557, 42.4002202611), (423.7137687189, 40.7290278601))
            Line((423.7137687189, 40.7290278601), (426.0665958227, 43.0818549639))
        make_face()
        with BuildLine():
            ThreePointArc((377.8116780768, 48.0209958305), (384.1793993243, 57.5509641444), (386.4154456688, 68.7923282385))
            ThreePointArc((386.4154456688, 68.7923282385), (384.1793993243, 80.0336923326), (377.8116780768, 89.5636606465))
            Line((377.8116780768, 89.5636606465), (357.0403456688, 68.7923282385))
            Line((357.0403456688, 68.7923282385), (377.8116780768, 48.0209958305))
        make_face()
        with BuildLine():
            ThreePointArc((382.5693179866, 45.2191559207), (381.3619702436, 47.0260795104), (379.230558544, 46.6021153633))
            ThreePointArc((379.230558544, 46.6021153633), (379.8650657296, 43.412232331), (382.5693179866, 45.2191559207))
        make_face()
        with BuildLine():
            ThreePointArc((335.422973351, 45.2191559207), (335.2740969407, 45.9676081777), (334.8501327936, 46.6021153633))
            ThreePointArc((334.8501327936, 46.6021153633), (331.6602497613, 44.4707036637), (335.422973351, 45.2191559207))
        make_face()
        with BuildLine():
            ThreePointArc((335.422973351, 92.3655005563), (331.6602497613, 93.1139528133), (334.8501327936, 90.9825411136))
            ThreePointArc((334.8501327936, 90.9825411136), (335.2740969407, 91.6170482993), (335.422973351, 92.3655005563))
        make_face()
        with BuildLine():
            ThreePointArc((382.5693179866, 92.3655005563), (379.8650657296, 94.172424146), (379.230558544, 90.9825411136))
            ThreePointArc((379.230558544, 90.9825411136), (381.3619702436, 90.5585769666), (382.5693179866, 92.3655005563))
        make_face()
        with BuildLine():
            Line((357.0403456688, 68.7923282385), (377.8116780768, 89.5636606465))
            ThreePointArc((377.8116780768, 89.5636606465), (357.0403456688, 98.1674282385), (336.2690132608, 89.5636606465))
            Line((336.2690132608, 89.5636606465), (357.0403456688, 68.7923282385))
        make_face()
        with BuildLine():
            ThreePointArc((336.2690132608, 48.0209958305), (357.0403456688, 39.4172282385), (377.8116780768, 48.0209958305))
            Line((377.8116780768, 48.0209958305), (357.0403456688, 68.7923282385))
            Line((357.0403456688, 68.7923282385), (336.2690132608, 48.0209958305))
        make_face()
        with BuildLine():
            Line((357.0403456688, 68.7923282385), (336.2690132608, 89.5636606465))
            ThreePointArc((336.2690132608, 89.5636606465), (327.6652456688, 68.7923282385), (336.2690132608, 48.0209958305))
            Line((336.2690132608, 48.0209958305), (357.0403456688, 68.7923282385))
        make_face()
    extrude(amount=-F4_DEPTH, mode=Mode.SUBTRACT)


solid = f2.part
